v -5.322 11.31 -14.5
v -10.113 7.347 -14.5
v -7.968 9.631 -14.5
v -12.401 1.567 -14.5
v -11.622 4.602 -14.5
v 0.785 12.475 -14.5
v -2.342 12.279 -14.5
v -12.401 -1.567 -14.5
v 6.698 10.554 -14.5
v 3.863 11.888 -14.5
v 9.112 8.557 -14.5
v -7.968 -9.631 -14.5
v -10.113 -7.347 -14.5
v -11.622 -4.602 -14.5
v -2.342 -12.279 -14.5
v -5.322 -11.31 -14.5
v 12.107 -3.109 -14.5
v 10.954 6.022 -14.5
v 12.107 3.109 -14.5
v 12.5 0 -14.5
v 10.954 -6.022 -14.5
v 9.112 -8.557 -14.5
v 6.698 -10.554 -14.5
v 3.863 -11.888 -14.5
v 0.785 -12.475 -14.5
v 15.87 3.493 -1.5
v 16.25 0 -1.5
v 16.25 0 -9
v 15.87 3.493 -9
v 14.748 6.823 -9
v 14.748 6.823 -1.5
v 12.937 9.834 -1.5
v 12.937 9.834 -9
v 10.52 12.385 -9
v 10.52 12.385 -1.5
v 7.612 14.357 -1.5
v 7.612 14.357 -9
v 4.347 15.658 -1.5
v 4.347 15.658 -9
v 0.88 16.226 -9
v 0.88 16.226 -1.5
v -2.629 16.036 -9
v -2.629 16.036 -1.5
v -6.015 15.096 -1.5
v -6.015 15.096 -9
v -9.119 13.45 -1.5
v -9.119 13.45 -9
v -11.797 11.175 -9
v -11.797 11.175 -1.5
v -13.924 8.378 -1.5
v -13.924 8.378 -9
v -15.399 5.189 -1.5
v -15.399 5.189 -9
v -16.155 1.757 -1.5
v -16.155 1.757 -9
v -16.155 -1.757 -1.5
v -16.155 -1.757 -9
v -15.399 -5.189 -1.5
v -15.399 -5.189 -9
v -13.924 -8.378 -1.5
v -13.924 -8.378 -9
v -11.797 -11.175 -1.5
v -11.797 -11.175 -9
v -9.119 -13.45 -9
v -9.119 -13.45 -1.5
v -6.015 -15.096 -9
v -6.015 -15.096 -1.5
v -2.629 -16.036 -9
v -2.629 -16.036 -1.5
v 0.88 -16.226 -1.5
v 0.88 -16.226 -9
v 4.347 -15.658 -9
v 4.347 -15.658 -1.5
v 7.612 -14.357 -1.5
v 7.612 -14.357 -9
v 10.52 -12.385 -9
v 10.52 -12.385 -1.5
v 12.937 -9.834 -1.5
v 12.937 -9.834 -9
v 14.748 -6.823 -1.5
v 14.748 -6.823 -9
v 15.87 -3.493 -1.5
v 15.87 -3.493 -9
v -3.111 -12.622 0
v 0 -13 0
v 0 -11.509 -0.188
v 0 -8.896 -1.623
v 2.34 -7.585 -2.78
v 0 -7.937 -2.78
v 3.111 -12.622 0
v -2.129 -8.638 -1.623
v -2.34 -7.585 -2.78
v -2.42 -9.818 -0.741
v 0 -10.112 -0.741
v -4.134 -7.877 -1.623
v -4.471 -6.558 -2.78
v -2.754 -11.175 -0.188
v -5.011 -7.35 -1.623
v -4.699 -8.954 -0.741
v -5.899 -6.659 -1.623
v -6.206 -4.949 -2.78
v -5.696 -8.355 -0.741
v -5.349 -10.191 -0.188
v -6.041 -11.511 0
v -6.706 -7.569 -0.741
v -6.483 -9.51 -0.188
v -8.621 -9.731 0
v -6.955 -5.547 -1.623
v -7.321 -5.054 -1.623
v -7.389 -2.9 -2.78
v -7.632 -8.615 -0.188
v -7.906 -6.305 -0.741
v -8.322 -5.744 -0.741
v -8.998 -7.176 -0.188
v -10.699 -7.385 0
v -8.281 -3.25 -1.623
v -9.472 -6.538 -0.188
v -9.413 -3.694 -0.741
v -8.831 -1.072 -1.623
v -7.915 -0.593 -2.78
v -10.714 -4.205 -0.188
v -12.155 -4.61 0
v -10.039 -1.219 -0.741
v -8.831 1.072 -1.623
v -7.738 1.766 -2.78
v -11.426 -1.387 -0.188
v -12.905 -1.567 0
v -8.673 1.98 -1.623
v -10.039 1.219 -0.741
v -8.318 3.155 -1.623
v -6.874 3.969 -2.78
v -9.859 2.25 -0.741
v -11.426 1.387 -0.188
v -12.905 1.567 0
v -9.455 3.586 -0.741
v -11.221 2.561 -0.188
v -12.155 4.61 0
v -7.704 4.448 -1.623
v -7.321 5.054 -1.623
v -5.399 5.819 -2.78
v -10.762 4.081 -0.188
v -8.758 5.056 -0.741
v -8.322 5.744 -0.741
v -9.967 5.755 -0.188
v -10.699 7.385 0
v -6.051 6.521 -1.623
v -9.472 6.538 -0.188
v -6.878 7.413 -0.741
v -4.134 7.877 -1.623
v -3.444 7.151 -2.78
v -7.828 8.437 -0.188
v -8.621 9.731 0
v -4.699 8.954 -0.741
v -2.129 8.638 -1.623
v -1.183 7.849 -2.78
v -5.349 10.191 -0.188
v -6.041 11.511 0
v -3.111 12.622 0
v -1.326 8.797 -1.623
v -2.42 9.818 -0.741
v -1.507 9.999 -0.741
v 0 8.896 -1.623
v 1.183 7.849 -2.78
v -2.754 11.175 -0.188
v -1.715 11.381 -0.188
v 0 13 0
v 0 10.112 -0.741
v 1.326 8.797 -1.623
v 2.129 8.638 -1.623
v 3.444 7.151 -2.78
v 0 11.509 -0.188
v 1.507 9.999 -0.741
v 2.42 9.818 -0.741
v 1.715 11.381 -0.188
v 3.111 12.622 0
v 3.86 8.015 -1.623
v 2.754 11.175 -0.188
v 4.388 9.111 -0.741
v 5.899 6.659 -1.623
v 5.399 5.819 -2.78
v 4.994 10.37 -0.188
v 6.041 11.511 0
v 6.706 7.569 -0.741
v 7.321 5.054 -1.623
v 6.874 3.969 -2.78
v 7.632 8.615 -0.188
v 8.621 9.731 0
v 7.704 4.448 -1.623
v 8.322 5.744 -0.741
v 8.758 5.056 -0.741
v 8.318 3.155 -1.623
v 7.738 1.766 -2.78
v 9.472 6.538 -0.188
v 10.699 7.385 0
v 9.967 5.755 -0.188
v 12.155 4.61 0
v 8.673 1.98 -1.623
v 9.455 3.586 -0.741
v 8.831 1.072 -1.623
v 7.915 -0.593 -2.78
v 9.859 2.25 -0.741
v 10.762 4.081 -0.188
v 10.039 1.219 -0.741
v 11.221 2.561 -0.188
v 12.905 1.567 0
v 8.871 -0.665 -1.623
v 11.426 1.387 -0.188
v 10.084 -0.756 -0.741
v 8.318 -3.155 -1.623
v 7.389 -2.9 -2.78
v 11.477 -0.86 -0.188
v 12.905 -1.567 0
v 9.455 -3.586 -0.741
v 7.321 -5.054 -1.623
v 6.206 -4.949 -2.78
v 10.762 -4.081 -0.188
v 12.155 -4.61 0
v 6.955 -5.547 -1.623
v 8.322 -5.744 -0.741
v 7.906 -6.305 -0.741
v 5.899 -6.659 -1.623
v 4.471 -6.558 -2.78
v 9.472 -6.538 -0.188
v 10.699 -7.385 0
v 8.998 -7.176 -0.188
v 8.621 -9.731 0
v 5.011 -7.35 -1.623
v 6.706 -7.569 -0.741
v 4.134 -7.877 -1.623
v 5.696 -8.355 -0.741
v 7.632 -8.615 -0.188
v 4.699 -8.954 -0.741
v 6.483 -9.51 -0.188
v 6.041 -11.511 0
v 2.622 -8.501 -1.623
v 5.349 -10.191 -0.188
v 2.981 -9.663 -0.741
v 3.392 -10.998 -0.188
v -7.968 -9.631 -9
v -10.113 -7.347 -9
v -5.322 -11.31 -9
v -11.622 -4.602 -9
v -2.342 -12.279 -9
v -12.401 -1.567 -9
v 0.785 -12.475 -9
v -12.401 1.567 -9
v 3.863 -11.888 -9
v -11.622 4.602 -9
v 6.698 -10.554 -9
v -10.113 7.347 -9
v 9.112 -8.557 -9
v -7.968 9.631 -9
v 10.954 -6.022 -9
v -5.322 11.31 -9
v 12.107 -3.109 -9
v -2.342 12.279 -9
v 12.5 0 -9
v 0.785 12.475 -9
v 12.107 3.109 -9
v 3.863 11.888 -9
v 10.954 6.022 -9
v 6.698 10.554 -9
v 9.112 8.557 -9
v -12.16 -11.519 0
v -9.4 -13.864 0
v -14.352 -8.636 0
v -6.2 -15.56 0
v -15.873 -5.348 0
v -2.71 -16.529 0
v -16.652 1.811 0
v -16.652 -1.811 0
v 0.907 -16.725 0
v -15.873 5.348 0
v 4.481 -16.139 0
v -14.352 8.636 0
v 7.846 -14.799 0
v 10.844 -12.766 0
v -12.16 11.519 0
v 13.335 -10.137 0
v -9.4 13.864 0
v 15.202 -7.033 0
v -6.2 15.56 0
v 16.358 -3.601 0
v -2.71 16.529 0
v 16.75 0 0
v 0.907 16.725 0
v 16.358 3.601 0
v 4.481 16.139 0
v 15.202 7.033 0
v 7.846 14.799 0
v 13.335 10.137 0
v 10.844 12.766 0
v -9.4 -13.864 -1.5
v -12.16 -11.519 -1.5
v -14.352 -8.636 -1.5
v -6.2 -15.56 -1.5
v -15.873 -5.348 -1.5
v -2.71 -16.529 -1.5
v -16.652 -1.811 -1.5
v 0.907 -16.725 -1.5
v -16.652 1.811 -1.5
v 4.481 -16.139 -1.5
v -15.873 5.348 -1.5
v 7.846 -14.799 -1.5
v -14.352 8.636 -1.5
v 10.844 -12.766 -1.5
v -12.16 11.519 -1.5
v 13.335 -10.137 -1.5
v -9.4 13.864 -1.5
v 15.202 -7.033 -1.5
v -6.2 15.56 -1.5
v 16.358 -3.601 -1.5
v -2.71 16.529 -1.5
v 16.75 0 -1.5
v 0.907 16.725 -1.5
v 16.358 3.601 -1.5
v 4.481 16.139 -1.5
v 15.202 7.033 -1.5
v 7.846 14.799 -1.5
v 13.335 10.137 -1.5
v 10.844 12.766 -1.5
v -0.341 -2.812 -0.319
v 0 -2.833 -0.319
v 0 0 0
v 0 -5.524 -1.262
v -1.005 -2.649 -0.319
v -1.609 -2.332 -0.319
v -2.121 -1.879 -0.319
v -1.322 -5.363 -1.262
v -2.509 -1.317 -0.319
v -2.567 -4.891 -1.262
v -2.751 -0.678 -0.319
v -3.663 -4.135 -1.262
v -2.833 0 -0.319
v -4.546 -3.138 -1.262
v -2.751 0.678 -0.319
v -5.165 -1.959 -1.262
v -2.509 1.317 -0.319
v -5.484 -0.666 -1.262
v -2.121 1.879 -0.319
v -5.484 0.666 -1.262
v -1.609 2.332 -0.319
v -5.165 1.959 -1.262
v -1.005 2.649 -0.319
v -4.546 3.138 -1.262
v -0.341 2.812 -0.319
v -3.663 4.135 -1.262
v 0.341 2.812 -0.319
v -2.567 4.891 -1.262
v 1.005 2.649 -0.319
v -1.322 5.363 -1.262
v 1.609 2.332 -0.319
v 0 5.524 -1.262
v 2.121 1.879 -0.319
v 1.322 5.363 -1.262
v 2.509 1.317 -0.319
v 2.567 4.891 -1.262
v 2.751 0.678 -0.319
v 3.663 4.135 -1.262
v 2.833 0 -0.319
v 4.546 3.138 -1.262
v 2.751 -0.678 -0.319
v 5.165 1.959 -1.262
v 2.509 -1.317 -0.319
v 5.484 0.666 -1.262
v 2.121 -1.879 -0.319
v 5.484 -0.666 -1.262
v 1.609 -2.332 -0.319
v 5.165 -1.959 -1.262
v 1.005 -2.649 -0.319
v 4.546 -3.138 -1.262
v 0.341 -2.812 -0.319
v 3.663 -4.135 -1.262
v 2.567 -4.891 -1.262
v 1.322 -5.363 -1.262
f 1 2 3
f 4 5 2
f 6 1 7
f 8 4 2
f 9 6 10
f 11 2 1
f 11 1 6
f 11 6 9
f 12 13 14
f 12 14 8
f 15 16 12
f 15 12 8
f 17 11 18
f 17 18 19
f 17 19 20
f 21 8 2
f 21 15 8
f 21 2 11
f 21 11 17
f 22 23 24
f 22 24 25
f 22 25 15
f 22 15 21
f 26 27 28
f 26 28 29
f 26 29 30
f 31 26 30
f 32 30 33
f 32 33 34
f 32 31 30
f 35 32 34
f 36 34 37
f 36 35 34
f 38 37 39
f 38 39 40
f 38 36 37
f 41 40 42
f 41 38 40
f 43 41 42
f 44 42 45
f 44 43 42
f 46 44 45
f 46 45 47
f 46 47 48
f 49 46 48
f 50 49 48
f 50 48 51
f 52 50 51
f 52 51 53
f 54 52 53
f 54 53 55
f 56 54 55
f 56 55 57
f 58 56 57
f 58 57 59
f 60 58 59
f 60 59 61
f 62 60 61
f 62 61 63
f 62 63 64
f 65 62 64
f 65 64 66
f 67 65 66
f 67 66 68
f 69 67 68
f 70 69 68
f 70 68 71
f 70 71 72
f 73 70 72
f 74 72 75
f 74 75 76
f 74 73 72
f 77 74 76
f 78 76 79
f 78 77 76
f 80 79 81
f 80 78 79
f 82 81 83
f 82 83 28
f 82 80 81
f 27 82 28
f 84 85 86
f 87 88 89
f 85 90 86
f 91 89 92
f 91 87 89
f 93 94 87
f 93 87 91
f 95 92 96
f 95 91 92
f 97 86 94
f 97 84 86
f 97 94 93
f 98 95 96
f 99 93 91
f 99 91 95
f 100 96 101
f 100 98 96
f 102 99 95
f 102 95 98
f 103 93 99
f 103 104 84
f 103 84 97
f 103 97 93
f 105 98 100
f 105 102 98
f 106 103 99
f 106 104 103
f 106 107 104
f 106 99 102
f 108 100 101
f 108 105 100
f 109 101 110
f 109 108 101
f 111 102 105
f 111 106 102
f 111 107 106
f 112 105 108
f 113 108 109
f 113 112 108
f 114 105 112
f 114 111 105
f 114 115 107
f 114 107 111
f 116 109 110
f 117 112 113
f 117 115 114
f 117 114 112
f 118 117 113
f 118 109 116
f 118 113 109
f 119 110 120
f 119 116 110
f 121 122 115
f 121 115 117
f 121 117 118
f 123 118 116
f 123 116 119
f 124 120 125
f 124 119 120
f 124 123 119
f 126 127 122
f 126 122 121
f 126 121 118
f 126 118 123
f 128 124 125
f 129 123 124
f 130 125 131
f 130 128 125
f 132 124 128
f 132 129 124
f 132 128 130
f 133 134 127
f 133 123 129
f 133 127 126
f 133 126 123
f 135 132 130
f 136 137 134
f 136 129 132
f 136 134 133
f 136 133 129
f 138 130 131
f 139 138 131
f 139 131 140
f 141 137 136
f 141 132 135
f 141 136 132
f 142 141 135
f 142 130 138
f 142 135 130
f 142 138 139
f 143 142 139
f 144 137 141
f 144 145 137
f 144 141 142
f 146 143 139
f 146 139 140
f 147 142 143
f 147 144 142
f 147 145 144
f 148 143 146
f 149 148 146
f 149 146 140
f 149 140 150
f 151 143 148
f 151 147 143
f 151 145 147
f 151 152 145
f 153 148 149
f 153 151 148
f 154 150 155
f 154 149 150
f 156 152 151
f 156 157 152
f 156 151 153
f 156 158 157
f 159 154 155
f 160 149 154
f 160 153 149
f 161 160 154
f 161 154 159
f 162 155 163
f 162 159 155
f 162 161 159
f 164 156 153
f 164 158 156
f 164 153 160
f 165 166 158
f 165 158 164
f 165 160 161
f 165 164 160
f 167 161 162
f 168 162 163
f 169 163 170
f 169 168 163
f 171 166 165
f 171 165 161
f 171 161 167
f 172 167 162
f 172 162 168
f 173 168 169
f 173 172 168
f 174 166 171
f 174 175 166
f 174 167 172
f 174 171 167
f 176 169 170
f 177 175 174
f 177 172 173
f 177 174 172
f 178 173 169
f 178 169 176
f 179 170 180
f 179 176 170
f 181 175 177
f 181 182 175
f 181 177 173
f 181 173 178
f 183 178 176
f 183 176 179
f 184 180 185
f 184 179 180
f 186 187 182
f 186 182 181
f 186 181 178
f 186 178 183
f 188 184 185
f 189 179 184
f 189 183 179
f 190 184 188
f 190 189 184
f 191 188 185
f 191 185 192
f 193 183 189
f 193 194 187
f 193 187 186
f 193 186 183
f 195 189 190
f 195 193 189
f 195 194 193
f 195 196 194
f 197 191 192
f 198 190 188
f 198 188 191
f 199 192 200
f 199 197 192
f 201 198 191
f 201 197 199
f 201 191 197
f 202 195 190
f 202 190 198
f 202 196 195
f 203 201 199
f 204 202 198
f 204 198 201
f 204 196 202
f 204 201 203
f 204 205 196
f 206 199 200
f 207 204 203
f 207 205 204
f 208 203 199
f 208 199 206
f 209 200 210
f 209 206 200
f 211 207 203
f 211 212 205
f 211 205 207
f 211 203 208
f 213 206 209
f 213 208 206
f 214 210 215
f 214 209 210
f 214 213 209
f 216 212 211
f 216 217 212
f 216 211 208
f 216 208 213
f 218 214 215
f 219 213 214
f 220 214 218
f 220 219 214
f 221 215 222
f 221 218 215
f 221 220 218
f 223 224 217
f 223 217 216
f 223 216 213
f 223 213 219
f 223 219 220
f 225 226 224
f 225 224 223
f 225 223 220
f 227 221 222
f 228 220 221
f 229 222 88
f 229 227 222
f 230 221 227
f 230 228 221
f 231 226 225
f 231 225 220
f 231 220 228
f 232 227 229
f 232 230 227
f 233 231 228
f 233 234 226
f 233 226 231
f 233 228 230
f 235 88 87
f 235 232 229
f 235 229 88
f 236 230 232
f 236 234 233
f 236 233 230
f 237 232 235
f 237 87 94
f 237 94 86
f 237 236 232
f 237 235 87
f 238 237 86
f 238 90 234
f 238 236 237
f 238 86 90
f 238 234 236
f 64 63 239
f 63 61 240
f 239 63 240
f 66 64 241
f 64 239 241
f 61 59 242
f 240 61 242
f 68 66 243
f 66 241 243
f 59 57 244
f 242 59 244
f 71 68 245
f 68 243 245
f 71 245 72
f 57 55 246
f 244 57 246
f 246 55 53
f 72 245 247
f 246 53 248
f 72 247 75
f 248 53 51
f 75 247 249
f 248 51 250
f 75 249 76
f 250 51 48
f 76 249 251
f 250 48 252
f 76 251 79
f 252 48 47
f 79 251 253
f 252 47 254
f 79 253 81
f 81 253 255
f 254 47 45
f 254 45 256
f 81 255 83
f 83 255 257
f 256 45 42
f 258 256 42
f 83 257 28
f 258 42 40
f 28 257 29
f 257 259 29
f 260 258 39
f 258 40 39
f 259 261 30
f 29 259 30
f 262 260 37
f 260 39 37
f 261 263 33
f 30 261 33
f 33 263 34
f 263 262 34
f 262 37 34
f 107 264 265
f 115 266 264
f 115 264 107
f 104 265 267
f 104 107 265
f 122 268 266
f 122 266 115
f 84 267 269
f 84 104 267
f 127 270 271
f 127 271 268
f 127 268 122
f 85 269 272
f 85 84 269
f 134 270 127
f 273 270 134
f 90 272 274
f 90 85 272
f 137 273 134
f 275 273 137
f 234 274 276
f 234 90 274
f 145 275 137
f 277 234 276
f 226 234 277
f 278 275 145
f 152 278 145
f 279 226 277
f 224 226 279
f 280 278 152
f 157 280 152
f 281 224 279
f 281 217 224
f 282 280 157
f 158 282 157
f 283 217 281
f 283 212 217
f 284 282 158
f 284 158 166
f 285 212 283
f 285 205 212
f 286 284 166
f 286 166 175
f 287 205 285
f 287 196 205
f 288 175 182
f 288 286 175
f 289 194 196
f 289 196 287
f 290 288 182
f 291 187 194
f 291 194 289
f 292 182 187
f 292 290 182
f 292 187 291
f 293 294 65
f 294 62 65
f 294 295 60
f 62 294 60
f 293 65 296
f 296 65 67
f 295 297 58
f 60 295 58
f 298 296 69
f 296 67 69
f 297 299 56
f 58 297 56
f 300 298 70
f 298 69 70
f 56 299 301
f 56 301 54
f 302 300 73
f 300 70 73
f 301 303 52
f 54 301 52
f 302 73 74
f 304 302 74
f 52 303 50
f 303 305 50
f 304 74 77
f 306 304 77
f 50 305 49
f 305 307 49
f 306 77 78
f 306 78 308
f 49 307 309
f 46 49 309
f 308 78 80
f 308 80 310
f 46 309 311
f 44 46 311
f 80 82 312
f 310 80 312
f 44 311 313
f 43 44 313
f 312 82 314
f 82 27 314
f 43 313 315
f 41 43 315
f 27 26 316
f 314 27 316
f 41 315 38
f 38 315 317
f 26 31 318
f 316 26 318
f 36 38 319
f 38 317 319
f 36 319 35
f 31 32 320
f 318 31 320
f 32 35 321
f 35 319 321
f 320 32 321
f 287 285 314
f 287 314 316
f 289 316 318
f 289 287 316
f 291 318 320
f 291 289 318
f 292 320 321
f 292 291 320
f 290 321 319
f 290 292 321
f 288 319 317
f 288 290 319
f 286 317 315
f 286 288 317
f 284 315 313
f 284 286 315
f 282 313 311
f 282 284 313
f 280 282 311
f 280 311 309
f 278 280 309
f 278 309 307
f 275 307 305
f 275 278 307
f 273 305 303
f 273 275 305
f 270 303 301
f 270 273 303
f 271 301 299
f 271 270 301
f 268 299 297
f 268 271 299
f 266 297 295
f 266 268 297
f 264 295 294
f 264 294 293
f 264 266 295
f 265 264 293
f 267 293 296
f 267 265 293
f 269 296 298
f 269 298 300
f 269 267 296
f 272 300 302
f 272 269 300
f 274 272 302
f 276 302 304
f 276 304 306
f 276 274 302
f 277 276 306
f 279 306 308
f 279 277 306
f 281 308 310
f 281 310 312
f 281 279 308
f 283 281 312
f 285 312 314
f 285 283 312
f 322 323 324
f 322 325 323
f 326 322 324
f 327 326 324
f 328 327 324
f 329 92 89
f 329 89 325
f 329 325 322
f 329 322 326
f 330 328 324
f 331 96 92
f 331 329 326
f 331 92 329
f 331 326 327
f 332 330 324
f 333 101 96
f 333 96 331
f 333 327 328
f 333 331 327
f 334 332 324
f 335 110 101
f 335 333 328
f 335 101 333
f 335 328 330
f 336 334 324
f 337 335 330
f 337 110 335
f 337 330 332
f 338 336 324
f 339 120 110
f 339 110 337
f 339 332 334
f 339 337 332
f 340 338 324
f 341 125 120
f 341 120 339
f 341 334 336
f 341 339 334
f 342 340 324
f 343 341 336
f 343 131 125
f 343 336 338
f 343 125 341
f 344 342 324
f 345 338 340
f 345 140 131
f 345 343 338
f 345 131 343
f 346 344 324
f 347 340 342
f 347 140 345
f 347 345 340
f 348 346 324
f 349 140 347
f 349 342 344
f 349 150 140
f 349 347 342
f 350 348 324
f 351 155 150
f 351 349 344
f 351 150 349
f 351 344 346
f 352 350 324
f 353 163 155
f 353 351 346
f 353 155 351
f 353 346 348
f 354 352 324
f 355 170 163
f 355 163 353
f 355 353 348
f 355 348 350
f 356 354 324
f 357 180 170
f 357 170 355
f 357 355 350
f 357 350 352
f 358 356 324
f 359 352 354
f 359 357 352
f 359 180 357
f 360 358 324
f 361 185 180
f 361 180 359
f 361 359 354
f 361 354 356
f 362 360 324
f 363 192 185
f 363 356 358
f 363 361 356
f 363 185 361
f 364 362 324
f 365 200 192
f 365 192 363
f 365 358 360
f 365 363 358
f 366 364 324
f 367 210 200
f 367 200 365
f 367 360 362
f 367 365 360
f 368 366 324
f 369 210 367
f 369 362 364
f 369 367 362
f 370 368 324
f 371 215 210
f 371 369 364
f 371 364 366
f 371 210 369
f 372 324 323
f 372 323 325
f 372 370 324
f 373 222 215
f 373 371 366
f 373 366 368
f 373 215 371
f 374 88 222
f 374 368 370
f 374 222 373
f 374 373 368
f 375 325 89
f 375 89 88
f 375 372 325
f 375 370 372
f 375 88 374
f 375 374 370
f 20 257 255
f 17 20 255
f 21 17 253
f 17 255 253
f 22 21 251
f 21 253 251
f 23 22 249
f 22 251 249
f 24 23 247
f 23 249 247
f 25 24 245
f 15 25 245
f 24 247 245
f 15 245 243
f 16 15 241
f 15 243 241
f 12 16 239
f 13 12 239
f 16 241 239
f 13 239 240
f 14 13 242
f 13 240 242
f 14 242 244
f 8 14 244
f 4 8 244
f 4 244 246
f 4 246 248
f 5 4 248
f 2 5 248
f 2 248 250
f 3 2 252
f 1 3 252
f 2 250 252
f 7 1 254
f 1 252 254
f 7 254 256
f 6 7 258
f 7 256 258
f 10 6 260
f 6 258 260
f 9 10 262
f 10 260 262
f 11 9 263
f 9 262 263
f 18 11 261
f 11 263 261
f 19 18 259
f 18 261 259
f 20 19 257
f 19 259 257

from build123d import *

# Parameters (mm, degrees)
SKETCH1_R           = 16.25
BOSS_EXTRUDE1_DEPTH = 9
SKETCH2_R           = 12.5
BOSS_EXTRUDE3_DEPTH = 5.5
SKETCH3_R           = 16.75
BOSS_EXTRUDE4_DEPTH = 1.5


with BuildPart() as part:
    # Sketch1 → Boss-Extrude1 (new body)
    with BuildSketch(Plane.XY):
        Circle(SKETCH1_R)
    extrude(amount=-BOSS_EXTRUDE1_DEPTH)

    # Sketch2 → Boss-Extrude3 (add)
    with BuildSketch(Plane(origin=(0, 0, -9), x_dir=(-1, 0, 0), z_dir=(0, 0, -1))):
        with Locations(Location((0, 0, 0), (0, 0, 180))):
            Circle(SKETCH2_R)
    extrude(amount=BOSS_EXTRUDE3_DEPTH)

    # Sketch3 → Boss-Extrude4 (add)
    with BuildSketch(Plane.XY):
        Circle(SKETCH3_R)
    extrude(amount=-BOSS_EXTRUDE4_DEPTH)

    # Sketch5 → Cut-Revolve4 (revolve, cut)
    with BuildSketch(Plane(origin=(0, 0, 0), x_dir=(0, 0, -1), z_dir=(1, 0, 0)), mode=Mode.PRIVATE) as cut_revolve4_sk:
        with BuildLine():
            Line((0, 13), (-11.197865554, 13))
            Line((-11.197865554, 13), (-11.197865554, 0))
            Line((-11.197865554, 0), (0, 0))
            ThreePointArc((0, 0), (0.714984963, 4.205055913), (2.779581743, 7.9375))
            ThreePointArc((2.779581743, 7.9375), (0.740603193, 10.112311438), (0, 13))
        make_face()
    revolve(cut_revolve4_sk.sketch.rotate(Axis((0, 0, 11.197865554), (0, 0, -1)), 180), axis=Axis((0, 0, 11.197865554), (0, 0, -1)), mode=Mode.SUBTRACT)


solid = part.part
